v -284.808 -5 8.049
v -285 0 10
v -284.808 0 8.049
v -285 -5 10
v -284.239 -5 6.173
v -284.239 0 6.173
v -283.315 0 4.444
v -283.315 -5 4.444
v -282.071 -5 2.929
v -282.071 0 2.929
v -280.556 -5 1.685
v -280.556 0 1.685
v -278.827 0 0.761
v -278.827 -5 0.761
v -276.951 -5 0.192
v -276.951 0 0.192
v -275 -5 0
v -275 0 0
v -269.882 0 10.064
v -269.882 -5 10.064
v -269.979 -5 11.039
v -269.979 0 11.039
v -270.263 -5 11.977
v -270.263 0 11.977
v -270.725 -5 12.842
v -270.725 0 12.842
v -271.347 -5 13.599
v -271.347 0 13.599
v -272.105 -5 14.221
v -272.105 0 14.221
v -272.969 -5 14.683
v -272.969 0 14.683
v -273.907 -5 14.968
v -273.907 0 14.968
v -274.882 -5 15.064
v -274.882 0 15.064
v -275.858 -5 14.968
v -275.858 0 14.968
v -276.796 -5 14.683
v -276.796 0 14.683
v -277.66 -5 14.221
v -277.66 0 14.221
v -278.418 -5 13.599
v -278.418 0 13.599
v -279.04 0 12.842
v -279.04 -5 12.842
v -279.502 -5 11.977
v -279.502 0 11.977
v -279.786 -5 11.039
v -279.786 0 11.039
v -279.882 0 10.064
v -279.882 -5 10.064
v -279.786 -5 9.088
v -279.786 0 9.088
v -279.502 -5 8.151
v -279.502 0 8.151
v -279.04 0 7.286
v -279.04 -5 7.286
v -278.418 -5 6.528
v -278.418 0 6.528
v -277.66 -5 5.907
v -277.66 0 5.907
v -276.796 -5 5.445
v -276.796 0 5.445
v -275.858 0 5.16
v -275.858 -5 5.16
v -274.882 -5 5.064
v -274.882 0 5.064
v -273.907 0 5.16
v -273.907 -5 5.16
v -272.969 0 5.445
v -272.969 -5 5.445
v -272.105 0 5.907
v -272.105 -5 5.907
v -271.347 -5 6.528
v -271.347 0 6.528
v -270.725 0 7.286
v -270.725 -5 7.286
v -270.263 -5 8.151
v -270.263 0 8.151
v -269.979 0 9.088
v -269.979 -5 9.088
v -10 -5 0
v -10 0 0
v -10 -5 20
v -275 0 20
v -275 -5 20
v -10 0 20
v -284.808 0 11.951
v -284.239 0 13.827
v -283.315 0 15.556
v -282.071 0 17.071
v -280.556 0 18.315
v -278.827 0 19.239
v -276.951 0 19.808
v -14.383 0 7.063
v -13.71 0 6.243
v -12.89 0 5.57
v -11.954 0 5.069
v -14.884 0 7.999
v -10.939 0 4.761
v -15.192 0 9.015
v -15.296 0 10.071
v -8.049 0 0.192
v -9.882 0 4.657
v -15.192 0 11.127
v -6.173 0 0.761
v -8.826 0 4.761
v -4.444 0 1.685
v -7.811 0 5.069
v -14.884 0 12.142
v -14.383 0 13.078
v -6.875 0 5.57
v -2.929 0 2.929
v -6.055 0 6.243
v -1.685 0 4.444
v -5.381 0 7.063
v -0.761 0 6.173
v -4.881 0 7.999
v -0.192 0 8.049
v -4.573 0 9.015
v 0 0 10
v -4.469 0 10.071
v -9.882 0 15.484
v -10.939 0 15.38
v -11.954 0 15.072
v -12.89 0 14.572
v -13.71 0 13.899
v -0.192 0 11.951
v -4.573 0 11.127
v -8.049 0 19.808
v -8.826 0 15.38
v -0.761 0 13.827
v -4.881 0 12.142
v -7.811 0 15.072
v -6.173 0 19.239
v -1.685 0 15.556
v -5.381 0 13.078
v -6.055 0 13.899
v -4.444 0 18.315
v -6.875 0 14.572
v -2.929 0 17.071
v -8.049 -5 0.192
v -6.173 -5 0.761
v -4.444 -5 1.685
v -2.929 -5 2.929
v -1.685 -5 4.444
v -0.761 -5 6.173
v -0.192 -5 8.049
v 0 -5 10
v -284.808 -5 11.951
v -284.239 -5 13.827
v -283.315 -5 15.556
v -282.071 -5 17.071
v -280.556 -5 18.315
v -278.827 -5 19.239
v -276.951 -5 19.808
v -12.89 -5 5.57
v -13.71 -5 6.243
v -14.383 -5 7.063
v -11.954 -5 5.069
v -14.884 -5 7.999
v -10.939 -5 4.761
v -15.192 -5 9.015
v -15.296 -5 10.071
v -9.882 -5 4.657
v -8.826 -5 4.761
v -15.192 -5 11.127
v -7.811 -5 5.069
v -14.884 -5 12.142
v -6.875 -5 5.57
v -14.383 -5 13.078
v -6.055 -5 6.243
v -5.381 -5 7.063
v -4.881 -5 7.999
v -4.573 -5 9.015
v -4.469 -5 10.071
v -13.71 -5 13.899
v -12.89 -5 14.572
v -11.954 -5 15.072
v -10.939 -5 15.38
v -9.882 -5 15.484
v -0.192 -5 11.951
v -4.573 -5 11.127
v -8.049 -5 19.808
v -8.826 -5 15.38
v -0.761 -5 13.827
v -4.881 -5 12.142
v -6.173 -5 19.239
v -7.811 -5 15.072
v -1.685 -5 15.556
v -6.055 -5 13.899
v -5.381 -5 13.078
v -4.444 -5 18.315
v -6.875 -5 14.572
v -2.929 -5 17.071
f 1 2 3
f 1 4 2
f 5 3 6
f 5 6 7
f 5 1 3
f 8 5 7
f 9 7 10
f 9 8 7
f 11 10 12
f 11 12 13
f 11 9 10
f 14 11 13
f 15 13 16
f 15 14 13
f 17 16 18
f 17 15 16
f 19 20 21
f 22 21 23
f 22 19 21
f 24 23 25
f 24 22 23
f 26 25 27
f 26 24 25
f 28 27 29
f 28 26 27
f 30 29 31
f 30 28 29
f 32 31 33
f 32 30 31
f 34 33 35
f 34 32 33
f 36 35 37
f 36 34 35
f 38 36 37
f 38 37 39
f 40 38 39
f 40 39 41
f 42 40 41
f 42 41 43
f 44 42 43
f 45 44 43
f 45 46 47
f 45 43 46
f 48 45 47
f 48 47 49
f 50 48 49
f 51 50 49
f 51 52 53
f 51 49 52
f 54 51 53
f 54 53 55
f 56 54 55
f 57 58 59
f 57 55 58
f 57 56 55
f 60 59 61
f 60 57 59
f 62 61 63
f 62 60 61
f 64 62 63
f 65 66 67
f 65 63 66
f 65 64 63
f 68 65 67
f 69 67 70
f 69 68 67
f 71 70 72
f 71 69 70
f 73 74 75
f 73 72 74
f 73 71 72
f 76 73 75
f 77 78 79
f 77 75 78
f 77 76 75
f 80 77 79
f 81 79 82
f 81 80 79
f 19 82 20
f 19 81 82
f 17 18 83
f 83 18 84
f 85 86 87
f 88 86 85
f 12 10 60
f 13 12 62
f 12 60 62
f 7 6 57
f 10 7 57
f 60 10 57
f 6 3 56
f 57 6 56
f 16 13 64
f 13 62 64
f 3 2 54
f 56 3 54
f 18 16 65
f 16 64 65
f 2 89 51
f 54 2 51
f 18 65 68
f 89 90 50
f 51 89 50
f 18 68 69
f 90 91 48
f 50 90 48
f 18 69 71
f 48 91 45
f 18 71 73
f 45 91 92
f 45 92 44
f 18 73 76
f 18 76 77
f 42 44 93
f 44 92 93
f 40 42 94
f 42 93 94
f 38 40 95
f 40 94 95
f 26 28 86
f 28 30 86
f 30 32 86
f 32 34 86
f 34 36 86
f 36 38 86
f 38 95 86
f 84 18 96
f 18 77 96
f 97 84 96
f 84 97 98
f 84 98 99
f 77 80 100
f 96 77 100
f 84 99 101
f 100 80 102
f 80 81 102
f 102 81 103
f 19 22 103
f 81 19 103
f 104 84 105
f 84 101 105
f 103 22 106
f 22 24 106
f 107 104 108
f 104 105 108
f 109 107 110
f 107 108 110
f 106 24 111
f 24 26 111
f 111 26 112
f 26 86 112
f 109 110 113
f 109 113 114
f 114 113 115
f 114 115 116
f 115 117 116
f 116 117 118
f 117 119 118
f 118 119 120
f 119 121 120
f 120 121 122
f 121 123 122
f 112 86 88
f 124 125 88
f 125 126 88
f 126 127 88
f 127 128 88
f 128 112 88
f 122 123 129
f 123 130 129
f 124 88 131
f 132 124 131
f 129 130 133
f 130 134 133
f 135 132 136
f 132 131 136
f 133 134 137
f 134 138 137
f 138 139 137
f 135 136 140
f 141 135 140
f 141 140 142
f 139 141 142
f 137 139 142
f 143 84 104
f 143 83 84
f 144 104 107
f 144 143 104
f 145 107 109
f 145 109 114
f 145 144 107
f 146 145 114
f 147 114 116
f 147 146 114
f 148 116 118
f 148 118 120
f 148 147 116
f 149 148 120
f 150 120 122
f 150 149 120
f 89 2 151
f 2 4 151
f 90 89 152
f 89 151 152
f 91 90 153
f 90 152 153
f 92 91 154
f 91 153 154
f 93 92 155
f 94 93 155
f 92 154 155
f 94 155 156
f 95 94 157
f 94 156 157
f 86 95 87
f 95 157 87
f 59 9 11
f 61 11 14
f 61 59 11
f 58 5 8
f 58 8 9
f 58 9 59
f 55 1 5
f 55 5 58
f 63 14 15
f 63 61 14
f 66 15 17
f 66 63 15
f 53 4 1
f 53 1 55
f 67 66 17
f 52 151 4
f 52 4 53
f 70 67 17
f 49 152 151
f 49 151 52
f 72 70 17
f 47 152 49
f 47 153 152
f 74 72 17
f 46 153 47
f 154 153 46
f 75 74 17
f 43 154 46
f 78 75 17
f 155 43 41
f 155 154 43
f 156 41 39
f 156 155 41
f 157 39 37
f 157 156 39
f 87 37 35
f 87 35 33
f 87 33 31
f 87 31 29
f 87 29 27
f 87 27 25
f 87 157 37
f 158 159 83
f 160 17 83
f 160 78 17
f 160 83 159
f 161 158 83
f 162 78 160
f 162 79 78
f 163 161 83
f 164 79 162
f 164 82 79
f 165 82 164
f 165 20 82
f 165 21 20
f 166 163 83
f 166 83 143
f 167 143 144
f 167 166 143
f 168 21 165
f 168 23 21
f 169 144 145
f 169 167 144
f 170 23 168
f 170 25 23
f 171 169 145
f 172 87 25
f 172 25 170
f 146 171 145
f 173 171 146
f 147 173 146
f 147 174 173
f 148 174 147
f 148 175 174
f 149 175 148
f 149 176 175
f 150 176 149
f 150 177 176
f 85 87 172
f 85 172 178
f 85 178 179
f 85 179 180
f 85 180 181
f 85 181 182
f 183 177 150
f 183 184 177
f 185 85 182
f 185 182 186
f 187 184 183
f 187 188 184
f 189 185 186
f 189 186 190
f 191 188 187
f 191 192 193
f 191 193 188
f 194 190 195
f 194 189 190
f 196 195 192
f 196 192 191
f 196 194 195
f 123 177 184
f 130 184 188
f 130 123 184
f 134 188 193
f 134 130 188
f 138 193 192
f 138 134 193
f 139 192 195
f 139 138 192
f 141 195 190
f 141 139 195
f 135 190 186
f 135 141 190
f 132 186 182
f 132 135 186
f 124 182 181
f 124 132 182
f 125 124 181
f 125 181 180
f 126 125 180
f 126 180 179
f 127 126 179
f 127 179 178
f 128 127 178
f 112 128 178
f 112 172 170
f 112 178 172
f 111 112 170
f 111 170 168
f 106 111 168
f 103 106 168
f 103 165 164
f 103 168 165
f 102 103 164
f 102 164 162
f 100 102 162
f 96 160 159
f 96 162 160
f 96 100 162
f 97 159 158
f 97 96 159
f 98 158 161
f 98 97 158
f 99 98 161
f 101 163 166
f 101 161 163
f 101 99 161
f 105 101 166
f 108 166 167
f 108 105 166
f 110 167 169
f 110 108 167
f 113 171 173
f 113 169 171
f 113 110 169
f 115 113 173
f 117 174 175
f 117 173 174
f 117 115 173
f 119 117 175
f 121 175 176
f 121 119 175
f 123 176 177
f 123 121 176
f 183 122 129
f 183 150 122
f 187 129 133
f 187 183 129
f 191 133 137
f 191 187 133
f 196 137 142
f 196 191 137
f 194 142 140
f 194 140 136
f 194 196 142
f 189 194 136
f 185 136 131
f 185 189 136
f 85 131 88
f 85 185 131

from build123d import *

# Parameters (mm, degrees)
F0_W     = 285
F0_H     = 20
F1_DEPTH = 5
F2_R     = 9.99999
F3_R     = 5
F3_R_2   = 5.4133078472
F4_DEPTH = 20


# Not quite as in the source:
# - a fillet or chamfer is up to 0.001 mm smaller than in the source, because OpenCascade refuses the exact size


with BuildPart() as f1:
    # F0 (on Front) → F1 (new body)
    with BuildSketch(Plane.XZ):
        with Locations((-142.5, 10)):
            Rectangle(F0_W, F0_H)
    extrude(amount=F1_DEPTH)

    # F2 (radius 10 in the source; OpenCascade refuses exactly that, so slightly less here)
    f2_edges = [f1.edges().sort_by_distance(p)[0] for p in [
        (0, -2.5, 20),
        (0, -2.5, 0),
        (-285, -2.5, 20),
        (-285, -2.5, 0),
    ]]
    fillet(f2_edges, radius=F2_R)

    # F3 (on Front) → F4 (cut)
    with BuildSketch(Plane.XZ):
        with Locations((-274.8824357986, 10.0639369339)):
            Circle(F3_R)
        with Locations((-9.8824357986, 10.070726499)):
            Circle(F3_R_2)
    extrude(amount=F4_DEPTH, mode=Mode.SUBTRACT)


solid = f1.part
